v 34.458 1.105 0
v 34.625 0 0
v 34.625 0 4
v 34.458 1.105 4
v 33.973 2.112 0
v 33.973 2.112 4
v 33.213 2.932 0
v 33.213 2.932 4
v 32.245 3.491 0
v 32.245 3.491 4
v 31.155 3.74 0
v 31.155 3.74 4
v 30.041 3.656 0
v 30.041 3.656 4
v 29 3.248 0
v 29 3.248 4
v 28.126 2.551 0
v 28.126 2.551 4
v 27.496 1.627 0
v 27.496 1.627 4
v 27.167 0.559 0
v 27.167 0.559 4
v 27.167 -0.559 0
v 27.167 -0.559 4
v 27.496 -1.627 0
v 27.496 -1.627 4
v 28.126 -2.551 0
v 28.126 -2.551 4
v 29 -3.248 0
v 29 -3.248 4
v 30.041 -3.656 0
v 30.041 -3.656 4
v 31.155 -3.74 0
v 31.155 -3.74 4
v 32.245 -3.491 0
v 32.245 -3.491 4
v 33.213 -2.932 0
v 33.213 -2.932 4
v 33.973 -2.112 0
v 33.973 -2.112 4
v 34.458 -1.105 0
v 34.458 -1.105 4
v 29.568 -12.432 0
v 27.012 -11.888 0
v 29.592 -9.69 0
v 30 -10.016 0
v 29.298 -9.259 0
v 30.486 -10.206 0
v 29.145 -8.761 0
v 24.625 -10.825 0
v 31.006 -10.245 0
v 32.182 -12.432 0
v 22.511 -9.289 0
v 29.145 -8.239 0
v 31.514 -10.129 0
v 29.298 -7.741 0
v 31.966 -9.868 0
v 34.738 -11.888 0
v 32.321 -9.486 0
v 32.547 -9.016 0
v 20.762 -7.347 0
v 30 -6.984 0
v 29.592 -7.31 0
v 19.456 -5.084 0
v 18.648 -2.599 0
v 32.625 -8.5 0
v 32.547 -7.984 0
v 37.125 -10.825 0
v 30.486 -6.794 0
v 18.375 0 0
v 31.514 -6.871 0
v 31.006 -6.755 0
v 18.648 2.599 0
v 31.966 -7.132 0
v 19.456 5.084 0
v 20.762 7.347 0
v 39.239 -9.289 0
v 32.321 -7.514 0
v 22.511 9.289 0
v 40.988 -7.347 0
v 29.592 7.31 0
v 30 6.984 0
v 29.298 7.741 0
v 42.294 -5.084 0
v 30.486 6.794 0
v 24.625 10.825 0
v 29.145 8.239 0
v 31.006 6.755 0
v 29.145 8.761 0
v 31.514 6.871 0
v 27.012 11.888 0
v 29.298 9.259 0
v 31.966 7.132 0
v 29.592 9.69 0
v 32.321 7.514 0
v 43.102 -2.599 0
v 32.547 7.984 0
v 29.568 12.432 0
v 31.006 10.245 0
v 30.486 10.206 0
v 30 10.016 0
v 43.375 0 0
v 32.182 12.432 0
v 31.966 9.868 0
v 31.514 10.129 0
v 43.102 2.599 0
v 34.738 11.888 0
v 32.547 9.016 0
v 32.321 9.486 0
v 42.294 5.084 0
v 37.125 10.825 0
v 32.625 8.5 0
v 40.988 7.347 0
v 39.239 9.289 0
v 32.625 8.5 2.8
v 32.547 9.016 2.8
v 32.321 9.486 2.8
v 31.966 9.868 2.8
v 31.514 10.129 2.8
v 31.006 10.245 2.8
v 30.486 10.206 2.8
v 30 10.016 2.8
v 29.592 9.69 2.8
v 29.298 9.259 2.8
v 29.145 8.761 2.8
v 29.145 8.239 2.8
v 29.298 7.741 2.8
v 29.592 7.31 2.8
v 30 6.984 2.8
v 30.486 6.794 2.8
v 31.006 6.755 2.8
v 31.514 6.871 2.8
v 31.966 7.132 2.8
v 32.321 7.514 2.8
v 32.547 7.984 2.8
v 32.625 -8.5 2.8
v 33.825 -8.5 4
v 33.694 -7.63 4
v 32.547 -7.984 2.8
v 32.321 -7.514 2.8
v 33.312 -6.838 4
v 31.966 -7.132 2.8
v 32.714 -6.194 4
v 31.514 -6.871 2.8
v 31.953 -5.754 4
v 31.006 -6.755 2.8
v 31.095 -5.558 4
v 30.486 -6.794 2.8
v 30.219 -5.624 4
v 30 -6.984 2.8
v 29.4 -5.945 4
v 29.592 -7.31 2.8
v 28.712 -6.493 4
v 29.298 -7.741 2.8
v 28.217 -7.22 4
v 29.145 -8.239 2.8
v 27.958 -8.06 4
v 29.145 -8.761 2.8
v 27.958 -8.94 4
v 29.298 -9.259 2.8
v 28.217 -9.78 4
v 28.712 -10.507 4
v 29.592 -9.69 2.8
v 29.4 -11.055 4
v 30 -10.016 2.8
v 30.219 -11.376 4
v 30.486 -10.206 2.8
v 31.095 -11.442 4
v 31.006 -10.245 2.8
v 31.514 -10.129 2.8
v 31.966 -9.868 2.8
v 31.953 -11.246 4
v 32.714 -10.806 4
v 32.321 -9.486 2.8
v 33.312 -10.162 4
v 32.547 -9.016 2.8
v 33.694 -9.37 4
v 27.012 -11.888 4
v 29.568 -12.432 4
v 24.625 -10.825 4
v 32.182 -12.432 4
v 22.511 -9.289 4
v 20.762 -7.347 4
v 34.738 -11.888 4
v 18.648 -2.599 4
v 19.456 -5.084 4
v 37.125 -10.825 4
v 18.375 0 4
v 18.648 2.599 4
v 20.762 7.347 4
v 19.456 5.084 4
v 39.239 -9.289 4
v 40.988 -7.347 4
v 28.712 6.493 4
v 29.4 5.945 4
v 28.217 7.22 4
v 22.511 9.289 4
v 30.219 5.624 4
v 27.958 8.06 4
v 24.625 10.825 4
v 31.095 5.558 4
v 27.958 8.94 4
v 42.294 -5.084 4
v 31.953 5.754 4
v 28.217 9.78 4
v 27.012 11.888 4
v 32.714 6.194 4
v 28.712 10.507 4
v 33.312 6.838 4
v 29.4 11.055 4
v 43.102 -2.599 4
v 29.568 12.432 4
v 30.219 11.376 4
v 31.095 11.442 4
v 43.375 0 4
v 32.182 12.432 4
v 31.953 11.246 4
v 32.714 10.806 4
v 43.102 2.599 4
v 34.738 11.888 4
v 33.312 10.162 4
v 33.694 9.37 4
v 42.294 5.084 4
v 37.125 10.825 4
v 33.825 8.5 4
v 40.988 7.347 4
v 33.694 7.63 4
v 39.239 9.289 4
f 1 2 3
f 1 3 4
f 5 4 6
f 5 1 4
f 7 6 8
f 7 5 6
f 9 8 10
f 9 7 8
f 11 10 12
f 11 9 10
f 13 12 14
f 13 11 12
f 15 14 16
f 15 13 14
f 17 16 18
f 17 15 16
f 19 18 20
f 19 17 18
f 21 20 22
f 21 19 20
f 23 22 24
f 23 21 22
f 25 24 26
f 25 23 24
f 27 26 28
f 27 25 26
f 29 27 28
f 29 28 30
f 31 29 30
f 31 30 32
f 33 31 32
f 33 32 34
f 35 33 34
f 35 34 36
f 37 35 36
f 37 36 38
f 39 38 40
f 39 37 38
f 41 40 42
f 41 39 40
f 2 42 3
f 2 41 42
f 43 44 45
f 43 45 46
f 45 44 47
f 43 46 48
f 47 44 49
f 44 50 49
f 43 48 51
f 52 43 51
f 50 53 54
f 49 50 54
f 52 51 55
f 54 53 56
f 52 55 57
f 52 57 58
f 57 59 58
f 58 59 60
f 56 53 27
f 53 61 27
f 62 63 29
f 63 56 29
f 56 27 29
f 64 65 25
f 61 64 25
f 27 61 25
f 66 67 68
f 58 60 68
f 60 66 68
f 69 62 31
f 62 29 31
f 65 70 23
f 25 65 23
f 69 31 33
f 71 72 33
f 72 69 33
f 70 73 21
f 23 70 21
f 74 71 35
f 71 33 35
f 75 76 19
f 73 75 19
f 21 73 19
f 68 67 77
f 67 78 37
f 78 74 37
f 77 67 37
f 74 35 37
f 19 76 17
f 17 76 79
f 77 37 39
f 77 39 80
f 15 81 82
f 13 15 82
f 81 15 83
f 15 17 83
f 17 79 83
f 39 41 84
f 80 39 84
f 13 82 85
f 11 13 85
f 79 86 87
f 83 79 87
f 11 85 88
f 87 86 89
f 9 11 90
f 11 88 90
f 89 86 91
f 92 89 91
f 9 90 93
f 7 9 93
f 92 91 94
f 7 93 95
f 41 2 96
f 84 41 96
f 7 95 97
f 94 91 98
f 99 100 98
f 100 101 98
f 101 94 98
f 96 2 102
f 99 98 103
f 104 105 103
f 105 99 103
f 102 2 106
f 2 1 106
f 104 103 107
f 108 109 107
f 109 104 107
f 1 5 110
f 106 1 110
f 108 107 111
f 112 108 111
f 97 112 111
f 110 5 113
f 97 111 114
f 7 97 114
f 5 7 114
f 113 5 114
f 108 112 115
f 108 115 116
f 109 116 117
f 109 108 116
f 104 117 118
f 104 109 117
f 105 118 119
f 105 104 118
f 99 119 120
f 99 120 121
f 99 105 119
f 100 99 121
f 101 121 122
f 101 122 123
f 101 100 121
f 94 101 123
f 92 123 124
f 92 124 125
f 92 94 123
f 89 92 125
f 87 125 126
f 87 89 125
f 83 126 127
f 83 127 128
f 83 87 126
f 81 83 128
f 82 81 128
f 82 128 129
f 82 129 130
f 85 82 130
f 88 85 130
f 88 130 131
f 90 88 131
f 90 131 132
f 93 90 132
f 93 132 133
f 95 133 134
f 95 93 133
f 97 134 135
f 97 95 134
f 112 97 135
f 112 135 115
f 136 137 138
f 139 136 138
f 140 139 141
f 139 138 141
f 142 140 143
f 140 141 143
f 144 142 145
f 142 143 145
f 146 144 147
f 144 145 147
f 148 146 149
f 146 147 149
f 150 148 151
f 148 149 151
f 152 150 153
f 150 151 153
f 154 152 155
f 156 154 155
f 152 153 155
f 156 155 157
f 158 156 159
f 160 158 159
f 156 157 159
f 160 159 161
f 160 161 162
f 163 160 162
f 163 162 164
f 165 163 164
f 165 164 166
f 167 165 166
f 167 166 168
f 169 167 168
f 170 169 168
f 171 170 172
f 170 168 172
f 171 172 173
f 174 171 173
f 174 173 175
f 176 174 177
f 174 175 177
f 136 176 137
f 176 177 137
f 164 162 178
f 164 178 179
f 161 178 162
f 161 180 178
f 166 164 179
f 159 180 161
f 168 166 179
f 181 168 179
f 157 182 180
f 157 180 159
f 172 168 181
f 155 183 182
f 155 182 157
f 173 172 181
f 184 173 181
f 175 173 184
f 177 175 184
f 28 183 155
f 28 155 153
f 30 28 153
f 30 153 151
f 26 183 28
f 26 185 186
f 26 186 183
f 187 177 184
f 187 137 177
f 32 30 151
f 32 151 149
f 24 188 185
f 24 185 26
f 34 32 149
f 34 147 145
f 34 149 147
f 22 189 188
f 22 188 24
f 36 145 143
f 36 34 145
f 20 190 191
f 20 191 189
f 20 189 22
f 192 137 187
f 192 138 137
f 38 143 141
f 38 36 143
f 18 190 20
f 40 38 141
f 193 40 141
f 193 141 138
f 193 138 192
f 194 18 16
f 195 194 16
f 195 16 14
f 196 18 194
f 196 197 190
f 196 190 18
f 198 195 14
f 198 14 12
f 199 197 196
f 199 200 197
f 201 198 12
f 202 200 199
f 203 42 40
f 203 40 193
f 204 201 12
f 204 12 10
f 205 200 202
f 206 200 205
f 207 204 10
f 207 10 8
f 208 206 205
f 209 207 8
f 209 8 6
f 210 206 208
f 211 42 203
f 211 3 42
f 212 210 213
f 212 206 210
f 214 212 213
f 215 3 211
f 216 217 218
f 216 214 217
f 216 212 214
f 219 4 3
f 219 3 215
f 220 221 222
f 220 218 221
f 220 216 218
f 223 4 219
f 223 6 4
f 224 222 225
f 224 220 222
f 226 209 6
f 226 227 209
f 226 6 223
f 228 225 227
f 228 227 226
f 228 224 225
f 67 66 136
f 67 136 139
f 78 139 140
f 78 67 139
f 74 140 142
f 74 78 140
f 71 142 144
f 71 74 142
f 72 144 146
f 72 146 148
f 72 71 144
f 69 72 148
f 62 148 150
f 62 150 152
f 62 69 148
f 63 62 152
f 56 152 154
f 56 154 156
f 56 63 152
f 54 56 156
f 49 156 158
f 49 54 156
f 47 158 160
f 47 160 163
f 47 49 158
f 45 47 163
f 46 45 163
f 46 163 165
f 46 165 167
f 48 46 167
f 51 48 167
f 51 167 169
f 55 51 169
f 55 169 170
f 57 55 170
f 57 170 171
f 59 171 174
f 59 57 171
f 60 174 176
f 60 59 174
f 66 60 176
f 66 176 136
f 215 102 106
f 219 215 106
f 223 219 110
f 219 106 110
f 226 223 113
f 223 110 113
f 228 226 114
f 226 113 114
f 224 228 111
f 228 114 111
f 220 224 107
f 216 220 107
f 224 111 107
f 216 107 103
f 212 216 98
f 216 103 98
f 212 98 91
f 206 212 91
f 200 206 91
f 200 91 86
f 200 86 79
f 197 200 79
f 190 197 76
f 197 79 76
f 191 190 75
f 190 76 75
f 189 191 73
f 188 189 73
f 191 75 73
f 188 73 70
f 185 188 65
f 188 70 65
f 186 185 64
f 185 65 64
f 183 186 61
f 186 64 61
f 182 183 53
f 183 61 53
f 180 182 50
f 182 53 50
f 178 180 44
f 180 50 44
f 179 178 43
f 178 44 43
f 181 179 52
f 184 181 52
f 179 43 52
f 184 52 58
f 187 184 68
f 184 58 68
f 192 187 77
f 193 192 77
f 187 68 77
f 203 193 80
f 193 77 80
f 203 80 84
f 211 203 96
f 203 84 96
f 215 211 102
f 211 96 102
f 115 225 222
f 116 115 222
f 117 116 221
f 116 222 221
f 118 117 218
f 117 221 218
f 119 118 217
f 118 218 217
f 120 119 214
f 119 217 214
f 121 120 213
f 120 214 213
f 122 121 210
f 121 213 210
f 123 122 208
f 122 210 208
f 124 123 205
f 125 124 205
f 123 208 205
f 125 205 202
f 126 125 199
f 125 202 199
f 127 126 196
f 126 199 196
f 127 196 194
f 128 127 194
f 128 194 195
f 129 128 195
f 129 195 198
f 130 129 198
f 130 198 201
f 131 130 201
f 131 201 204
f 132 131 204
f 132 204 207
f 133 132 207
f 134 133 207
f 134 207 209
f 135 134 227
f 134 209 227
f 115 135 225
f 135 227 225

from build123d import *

# Parameters (mm, degrees)
SKETCH1_R           = 12.5
SKETCH1_R_2         = 1.75
SKETCH1_R_3         = 3.75
BOSS_EXTRUDE1_DEPTH = 4
CHAMFER2_SIZE       = 1.2


with BuildPart() as part:
    # Sketch1 → Boss-Extrude1 (new body)
    with BuildSketch(Plane.XY):
        with Locations((30.875, 0)):
            Circle(SKETCH1_R)
        with Locations((30.875, 8.5)):
            Circle(SKETCH1_R_2, mode=Mode.SUBTRACT)
        with Locations((30.875, -8.5)):
            Circle(SKETCH1_R_2, mode=Mode.SUBTRACT)
        with Locations((30.875, 0)):
            Circle(SKETCH1_R_3, mode=Mode.SUBTRACT)
    extrude(amount=BOSS_EXTRUDE1_DEPTH)

    # Chamfer2
    chamfer2_edges = [part.edges().sort_by_distance(p)[0] for p in [
        (29.125, 8.5, 4),
        (29.125, -8.5, 4),
    ]]
    chamfer(chamfer2_edges, length=CHAMFER2_SIZE)


solid = part.part
